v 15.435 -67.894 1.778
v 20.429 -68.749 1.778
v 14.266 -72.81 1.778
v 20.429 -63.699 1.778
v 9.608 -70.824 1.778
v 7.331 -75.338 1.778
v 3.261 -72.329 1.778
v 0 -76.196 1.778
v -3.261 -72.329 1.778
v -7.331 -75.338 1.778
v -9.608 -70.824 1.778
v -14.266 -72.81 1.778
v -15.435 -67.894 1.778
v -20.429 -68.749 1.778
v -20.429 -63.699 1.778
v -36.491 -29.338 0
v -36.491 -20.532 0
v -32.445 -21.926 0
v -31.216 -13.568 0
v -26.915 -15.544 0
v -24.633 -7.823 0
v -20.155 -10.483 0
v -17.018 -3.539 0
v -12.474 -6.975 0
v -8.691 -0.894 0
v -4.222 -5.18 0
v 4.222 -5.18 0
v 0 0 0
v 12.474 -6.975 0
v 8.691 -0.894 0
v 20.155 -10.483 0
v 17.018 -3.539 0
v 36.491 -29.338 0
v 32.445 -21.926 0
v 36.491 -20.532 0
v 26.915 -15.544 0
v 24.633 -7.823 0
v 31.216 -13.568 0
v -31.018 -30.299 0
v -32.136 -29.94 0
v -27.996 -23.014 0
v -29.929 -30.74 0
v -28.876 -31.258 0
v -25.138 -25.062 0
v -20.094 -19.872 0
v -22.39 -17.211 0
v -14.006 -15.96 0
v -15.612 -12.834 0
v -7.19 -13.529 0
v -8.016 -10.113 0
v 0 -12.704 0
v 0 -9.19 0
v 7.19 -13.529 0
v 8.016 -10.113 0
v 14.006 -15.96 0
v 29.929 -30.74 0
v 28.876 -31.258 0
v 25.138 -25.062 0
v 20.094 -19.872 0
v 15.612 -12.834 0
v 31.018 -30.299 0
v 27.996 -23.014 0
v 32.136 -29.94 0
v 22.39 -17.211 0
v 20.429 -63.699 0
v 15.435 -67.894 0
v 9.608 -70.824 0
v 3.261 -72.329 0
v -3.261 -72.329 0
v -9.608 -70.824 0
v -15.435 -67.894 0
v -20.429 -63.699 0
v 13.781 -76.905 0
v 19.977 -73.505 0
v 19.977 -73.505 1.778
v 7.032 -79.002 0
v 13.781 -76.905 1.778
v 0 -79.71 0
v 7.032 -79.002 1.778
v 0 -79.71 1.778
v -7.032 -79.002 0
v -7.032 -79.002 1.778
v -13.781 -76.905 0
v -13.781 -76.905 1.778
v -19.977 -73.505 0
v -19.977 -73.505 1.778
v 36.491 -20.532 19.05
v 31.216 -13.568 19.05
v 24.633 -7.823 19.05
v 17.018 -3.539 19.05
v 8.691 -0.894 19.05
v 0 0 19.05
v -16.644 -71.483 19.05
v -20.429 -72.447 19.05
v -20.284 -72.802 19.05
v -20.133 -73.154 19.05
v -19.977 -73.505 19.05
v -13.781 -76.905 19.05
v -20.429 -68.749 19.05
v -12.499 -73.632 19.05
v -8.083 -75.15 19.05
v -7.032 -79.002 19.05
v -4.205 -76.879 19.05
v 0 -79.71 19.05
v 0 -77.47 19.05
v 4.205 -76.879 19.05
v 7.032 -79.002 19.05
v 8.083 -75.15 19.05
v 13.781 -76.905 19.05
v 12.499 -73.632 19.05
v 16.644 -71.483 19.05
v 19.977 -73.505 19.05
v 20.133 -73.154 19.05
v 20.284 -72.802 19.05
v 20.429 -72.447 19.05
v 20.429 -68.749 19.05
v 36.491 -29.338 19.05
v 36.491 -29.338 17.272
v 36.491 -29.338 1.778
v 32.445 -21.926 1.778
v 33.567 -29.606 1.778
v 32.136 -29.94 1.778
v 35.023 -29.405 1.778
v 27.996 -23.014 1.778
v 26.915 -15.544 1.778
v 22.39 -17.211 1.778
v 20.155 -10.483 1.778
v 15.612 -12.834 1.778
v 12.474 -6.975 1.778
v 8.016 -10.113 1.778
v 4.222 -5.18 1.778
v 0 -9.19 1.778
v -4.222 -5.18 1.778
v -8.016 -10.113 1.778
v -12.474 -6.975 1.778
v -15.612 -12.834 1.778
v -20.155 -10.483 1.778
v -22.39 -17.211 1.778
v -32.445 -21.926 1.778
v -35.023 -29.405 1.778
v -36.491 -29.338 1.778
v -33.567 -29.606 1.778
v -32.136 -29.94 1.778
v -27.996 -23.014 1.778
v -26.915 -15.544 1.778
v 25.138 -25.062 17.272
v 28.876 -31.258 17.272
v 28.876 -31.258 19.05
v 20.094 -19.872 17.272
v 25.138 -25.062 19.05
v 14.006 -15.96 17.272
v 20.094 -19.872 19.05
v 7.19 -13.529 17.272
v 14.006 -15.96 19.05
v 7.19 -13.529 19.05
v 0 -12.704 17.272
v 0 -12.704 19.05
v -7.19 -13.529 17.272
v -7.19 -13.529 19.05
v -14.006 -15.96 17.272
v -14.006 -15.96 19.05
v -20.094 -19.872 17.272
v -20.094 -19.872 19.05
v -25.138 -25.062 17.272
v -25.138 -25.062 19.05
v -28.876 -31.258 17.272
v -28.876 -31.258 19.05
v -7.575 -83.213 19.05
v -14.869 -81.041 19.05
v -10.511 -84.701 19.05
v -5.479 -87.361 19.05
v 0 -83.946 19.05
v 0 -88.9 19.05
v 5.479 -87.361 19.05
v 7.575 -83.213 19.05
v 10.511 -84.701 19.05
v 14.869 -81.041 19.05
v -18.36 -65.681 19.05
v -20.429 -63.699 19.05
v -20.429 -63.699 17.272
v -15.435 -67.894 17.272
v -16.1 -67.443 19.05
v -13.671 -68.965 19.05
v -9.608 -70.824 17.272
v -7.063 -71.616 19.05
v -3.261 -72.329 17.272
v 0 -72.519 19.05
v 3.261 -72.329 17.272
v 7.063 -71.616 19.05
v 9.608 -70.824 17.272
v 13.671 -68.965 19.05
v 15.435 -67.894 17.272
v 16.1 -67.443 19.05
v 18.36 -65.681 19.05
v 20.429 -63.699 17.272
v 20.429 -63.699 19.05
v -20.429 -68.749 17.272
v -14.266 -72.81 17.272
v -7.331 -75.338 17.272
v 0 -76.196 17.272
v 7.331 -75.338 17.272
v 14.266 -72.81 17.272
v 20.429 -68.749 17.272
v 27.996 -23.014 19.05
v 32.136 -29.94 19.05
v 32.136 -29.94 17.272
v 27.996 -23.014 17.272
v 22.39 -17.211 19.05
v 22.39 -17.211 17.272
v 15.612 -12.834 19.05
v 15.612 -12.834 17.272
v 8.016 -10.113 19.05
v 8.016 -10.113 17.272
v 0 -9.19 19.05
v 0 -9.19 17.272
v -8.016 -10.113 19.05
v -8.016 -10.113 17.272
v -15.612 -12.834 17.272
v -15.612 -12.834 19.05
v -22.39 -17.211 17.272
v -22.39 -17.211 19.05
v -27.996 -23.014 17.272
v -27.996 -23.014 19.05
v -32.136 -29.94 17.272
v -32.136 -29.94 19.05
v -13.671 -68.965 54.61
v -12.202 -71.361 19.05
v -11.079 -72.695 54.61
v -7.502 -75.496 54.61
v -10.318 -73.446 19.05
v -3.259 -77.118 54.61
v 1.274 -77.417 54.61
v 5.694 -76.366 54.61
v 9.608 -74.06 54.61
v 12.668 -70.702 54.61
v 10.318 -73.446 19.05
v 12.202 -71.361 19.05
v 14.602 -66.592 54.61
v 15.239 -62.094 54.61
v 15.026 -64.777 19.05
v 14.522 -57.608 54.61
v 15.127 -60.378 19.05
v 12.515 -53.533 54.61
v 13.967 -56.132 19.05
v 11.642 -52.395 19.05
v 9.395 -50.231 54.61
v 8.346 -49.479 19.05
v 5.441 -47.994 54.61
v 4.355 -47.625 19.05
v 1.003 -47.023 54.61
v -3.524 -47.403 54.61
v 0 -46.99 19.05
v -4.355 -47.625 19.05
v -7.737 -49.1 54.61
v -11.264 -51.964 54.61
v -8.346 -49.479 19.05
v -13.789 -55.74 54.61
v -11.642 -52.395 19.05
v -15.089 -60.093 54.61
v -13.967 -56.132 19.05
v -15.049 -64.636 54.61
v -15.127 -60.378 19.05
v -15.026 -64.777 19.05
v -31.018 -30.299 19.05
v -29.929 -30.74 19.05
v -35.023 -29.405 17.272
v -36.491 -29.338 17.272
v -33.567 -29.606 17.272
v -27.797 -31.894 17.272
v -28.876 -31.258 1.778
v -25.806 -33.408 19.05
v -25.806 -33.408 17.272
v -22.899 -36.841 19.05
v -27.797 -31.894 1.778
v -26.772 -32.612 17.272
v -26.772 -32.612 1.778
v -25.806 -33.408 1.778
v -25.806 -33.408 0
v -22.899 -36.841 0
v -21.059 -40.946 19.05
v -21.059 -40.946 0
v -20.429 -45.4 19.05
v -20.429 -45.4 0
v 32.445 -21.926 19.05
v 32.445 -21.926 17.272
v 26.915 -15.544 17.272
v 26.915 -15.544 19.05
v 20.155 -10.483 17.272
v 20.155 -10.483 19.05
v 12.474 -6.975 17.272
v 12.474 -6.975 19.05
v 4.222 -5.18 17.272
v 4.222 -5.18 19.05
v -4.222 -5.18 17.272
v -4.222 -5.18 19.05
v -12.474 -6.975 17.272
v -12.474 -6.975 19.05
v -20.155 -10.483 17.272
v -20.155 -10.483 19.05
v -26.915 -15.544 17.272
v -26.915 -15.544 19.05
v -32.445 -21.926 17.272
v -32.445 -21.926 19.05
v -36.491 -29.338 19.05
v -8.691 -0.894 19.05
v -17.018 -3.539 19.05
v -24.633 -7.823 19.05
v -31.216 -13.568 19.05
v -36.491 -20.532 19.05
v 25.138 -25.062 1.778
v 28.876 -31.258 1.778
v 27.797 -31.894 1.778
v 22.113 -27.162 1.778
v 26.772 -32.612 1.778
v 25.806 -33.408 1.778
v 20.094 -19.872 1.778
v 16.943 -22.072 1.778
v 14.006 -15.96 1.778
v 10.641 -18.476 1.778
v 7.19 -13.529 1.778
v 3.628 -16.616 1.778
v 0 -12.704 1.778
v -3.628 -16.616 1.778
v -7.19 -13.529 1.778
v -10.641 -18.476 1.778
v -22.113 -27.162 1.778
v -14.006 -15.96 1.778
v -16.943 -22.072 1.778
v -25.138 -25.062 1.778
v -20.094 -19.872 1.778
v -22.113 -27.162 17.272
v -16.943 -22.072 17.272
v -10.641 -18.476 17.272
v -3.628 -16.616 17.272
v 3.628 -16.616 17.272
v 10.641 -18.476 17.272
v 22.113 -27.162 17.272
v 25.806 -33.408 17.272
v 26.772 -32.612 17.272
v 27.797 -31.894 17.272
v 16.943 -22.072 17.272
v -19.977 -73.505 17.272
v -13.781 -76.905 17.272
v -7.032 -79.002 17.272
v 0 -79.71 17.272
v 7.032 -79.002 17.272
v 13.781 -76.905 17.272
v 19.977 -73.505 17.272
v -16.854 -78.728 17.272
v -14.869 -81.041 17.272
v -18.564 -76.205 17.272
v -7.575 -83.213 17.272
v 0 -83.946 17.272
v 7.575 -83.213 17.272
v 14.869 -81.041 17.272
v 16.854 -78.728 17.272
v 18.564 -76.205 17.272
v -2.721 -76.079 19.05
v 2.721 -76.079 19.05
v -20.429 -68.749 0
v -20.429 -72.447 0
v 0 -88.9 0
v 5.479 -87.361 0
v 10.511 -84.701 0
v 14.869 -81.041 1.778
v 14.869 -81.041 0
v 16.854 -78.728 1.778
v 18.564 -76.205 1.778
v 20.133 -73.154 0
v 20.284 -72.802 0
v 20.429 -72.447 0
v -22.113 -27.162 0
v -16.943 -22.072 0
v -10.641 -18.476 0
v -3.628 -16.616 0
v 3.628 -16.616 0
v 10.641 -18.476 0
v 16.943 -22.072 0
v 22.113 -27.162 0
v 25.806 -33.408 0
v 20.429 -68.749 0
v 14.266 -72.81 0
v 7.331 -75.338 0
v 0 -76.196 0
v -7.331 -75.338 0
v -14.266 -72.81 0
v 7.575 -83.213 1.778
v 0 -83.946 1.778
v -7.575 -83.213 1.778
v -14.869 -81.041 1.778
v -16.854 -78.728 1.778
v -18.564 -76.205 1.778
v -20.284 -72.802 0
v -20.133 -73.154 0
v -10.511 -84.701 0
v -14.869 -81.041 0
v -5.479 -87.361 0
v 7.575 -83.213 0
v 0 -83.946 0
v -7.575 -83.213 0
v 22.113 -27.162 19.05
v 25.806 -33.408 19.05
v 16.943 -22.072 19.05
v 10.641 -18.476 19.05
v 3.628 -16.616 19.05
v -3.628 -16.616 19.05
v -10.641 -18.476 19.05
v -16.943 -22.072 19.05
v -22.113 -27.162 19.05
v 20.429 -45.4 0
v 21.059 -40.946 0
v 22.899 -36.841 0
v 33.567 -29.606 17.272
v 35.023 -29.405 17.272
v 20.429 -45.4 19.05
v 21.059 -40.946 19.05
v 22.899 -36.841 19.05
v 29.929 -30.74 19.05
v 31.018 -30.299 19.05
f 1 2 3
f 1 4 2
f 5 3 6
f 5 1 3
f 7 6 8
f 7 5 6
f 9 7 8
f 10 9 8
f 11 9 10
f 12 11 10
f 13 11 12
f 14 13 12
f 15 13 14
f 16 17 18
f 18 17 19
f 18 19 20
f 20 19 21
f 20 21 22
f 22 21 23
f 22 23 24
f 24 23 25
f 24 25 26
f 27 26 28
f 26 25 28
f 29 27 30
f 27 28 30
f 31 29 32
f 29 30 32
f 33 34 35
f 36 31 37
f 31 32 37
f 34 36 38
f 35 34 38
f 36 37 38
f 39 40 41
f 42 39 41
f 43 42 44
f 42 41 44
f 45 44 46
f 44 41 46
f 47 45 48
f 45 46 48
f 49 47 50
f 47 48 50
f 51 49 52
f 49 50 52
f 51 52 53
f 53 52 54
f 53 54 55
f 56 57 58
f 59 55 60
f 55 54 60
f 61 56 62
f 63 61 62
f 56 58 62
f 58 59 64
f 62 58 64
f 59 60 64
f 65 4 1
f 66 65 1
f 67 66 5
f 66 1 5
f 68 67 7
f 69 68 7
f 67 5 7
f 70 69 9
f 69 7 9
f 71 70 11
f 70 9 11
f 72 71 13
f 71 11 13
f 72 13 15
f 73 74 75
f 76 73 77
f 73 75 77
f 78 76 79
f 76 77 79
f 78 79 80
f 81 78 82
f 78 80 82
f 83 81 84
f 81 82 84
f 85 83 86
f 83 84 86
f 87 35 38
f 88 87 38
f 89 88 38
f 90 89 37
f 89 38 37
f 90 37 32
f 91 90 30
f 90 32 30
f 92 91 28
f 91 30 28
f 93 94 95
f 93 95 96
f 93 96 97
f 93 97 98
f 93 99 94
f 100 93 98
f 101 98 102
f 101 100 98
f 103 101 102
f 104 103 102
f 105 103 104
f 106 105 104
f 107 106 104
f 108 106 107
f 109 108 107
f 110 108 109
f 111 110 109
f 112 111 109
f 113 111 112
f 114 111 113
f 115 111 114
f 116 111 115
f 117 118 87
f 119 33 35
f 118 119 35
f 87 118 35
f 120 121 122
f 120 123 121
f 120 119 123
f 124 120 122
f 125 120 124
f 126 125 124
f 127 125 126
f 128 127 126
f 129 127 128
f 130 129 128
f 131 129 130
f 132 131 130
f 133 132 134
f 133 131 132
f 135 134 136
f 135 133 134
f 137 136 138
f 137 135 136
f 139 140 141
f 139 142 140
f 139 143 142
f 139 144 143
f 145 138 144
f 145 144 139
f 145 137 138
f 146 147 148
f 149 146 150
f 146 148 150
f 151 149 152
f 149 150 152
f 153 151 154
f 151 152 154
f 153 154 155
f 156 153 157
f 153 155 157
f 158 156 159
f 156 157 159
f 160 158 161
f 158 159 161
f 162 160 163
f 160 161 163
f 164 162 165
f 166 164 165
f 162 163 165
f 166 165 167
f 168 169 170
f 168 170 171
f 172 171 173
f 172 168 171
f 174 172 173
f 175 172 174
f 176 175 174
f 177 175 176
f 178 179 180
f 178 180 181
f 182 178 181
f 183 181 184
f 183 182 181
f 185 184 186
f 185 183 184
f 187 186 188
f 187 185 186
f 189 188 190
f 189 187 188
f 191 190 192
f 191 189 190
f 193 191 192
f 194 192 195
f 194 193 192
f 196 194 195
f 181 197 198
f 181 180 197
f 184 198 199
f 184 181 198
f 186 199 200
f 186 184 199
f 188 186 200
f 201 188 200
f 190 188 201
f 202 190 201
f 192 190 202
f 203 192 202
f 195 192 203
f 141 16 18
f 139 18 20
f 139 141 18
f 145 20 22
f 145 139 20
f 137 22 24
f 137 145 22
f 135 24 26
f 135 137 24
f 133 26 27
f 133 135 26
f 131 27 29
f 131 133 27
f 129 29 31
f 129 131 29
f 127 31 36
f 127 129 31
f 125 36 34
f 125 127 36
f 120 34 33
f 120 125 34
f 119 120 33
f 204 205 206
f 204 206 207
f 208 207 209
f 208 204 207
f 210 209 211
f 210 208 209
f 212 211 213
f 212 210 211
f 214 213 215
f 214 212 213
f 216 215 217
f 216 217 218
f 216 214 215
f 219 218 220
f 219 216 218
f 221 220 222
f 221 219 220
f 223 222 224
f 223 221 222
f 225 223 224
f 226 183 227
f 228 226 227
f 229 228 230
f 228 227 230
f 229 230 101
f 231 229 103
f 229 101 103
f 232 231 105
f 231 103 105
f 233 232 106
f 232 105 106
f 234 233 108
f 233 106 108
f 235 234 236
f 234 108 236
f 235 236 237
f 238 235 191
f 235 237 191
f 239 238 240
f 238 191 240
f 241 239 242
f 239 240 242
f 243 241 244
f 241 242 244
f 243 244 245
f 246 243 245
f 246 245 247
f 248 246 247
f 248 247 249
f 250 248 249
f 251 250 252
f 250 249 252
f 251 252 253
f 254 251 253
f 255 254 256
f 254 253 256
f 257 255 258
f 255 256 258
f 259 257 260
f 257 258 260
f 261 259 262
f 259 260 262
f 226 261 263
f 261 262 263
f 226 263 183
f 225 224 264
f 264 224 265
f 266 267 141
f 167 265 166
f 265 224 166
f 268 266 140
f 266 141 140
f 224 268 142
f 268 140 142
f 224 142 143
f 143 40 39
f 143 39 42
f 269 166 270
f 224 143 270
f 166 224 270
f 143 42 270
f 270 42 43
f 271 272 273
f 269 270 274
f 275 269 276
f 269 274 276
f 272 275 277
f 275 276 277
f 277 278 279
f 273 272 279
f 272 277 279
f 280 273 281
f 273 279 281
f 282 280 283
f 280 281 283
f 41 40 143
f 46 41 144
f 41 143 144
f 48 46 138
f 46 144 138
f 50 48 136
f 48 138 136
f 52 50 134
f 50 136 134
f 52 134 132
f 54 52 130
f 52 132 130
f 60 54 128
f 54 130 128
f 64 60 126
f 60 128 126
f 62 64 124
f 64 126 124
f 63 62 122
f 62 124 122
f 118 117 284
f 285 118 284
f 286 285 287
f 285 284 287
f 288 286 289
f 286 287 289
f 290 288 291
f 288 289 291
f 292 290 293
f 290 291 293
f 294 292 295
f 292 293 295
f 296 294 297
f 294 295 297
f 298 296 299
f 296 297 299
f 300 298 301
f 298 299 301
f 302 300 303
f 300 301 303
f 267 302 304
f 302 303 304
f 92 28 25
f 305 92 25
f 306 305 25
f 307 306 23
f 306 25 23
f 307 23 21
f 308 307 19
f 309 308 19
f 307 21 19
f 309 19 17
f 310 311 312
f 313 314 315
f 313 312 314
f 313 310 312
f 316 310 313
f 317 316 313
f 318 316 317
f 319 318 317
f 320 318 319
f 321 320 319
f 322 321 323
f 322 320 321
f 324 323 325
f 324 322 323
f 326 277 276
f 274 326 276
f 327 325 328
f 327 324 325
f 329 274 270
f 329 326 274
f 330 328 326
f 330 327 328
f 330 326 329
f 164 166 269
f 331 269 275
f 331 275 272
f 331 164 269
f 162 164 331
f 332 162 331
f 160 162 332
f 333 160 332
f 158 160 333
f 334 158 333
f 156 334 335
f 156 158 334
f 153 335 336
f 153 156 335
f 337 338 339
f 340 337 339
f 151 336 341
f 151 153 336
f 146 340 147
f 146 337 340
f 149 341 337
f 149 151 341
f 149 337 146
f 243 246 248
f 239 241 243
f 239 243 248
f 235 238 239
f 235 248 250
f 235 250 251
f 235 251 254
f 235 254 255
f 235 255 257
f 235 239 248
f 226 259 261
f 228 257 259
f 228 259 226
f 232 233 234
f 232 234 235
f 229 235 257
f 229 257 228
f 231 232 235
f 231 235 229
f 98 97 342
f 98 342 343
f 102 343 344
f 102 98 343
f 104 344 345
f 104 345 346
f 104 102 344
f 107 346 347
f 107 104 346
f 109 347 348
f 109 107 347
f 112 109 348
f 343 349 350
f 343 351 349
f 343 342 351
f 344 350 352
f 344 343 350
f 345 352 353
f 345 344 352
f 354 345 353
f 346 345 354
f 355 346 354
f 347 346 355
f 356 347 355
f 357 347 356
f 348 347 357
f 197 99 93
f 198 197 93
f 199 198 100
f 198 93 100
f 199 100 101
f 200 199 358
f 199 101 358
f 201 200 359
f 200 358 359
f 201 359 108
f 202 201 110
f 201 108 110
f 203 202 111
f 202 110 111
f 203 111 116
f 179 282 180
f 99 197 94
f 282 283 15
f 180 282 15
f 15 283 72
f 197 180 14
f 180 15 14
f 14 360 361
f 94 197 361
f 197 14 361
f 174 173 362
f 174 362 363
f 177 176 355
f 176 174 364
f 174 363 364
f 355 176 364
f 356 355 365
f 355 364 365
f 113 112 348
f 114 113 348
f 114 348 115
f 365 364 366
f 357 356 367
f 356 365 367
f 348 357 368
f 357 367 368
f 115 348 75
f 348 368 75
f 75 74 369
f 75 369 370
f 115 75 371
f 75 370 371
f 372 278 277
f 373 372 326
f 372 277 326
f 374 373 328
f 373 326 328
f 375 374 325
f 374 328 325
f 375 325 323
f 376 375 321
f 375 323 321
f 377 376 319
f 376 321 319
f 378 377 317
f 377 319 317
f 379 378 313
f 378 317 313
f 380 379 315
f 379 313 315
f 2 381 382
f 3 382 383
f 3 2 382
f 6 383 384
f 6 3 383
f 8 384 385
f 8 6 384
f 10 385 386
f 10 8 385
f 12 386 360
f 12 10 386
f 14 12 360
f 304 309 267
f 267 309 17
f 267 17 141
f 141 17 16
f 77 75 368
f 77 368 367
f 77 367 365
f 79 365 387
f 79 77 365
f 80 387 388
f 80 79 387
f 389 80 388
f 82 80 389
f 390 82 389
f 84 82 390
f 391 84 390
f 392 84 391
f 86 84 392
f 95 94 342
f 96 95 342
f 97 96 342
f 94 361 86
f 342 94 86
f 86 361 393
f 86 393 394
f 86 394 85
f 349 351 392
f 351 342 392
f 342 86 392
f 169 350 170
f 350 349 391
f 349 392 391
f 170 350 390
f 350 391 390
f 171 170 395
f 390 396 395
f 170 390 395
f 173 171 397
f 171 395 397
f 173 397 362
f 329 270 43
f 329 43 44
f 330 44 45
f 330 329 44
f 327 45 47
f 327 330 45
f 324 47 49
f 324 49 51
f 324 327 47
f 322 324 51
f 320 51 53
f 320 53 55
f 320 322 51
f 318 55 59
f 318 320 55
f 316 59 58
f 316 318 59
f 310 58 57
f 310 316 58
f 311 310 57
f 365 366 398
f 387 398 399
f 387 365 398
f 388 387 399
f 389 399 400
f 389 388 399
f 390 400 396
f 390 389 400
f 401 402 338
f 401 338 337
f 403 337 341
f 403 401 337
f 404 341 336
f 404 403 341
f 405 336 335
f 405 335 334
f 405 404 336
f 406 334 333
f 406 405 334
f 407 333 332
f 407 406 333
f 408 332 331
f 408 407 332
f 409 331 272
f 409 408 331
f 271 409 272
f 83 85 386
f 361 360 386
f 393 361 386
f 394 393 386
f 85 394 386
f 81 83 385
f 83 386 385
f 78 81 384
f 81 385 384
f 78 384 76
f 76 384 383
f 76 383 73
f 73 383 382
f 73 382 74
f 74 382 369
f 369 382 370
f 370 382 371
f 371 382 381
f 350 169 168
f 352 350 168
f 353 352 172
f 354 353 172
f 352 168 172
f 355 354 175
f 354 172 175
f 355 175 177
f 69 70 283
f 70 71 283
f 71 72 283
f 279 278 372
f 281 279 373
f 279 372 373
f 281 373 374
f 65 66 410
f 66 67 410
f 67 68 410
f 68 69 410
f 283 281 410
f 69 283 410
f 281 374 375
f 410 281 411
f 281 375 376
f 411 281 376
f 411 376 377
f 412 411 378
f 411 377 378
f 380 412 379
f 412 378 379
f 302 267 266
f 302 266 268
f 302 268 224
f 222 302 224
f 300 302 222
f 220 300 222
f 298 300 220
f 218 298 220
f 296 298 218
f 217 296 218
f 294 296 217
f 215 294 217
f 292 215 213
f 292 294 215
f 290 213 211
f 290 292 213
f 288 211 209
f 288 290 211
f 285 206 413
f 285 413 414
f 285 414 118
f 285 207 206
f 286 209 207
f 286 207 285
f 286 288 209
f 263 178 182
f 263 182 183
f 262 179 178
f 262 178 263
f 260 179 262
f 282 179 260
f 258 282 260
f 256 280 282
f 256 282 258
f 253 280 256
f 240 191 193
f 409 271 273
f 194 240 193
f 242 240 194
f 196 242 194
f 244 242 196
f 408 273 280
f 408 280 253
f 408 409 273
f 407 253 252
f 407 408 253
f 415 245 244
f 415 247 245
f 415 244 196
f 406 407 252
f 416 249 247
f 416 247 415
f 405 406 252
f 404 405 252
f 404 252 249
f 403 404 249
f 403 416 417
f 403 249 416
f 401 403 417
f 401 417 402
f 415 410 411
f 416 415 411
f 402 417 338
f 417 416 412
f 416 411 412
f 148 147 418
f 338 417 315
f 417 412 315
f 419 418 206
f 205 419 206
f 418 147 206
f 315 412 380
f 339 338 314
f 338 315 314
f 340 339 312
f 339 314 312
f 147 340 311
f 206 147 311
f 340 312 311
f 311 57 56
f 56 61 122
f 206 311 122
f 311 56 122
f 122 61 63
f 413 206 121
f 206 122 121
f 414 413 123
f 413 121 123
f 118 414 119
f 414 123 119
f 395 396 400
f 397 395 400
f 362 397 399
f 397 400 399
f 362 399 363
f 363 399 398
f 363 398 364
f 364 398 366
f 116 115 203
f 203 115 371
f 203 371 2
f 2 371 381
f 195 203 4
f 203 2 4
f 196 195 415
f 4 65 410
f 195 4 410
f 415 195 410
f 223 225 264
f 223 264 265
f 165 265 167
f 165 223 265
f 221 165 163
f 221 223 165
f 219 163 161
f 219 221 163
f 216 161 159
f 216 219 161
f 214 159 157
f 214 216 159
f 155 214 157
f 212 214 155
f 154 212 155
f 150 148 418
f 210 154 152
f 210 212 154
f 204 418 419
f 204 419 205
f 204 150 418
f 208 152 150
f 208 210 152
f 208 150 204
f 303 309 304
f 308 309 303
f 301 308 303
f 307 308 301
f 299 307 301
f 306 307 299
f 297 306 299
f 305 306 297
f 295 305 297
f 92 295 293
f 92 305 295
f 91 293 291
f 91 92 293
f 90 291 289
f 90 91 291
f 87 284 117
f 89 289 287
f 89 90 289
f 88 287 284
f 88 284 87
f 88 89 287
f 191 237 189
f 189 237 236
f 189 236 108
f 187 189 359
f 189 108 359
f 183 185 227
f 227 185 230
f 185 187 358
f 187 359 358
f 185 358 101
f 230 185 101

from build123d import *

# Parameters (mm, degrees)
BOSS_EXTRUDE2_DEPTH = 19.05
SKETCH3_R           = 39.496431486
SKETCH3_R_2         = 35.260007957
CUT_EXTRUDE2_DEPTH  = 1.778
SKETCH4_R           = 31.746180351
SKETCH4_R_2         = 28.068999156
CUT_EXTRUDE3_DEPTH  = 1.778
CUT_EXTRUDE4_START  = -1.778
SKETCH5_R           = 39.496431486
SKETCH5_R_2         = 35.260007957
CUT_EXTRUDE4_DEPTH  = 1.778
CUT_EXTRUDE5_START  = -1.778
SKETCH7_R           = 31.746180351
SKETCH7_R_2         = 28.068999156
CUT_EXTRUDE5_DEPTH  = 1.778
SKETCH8_R           = 15.24
BOSS_EXTRUDE3_DEPTH = 35.56


with BuildPart() as part:
    # Sketch2 → Boss-Extrude2 (new body)
    with BuildSketch(Plane.XY):
        with BuildLine():
            Line((20.429296249, -72.446914532), (20.429296249, -45.399816154))
            ThreePointArc((20.429296249, -45.399816154), (25.133677026, -34.04243628), (36.4910569, -29.338055504))
            Line((36.4910569, -29.338055504), (36.4910569, -20.532405534))
            ThreePointArc((36.4910569, -20.532405534), (20.935477727, -5.485511485), (0, 0))
            ThreePointArc((0, 0), (-20.935477727, -5.485511485), (-36.4910569, -20.532405534))
            Line((-36.4910569, -20.532405534), (-36.4910569, -29.338055504))
            ThreePointArc((-36.4910569, -29.338055504), (-25.133677026, -34.04243628), (-20.429296249, -45.399816154))
            Line((-20.429296249, -45.399816154), (-20.429296249, -72.446914532))
            ThreePointArc((-20.429296249, -72.446914532), (-12.360356233, -83.33771782), (0, -88.9))
            ThreePointArc((0, -88.9), (12.360356233, -83.33771782), (20.429296249, -72.446914532))
        make_face()
    extrude(amount=BOSS_EXTRUDE2_DEPTH)

    # Sketch3 → Cut-Extrude2 (cut)
    with BuildSketch(Plane.XY.offset(19.05)):
        with Locations((0, -44.45)):
            Circle(SKETCH3_R)
        with Locations((0, -44.45)):
            Circle(SKETCH3_R_2, mode=Mode.SUBTRACT)
    extrude(amount=-CUT_EXTRUDE2_DEPTH, mode=Mode.SUBTRACT)

    # Sketch4 → Cut-Extrude3 (cut)
    with BuildSketch(Plane.XY.offset(19.05)):
        with Locations((0, -44.45)):
            Circle(SKETCH4_R)
        with Locations((0, -44.45)):
            Circle(SKETCH4_R_2, mode=Mode.SUBTRACT)
    extrude(amount=-CUT_EXTRUDE3_DEPTH, mode=Mode.SUBTRACT)

    # Sketch5 → Cut-Extrude4 (cut)
    with BuildSketch(Plane(origin=(0, 0, 0), x_dir=(-1, 0, 0), z_dir=(0, 0, -1)).offset(CUT_EXTRUDE4_START)):
        with Locations((0, -44.45)):
            Circle(SKETCH5_R)
        with Locations((0, -44.45)):
            Circle(SKETCH5_R_2, mode=Mode.SUBTRACT)
    extrude(amount=CUT_EXTRUDE4_DEPTH, mode=Mode.SUBTRACT)

    # Sketch7 → Cut-Extrude5 (cut)
    with BuildSketch(Plane(origin=(0, 0, 0), x_dir=(-1, 0, 0), z_dir=(0, 0, -1)).offset(CUT_EXTRUDE5_START)):
        with Locations((0, -44.45)):
            Circle(SKETCH7_R)
        with Locations((0, -44.45)):
            Circle(SKETCH7_R_2, mode=Mode.SUBTRACT)
    extrude(amount=CUT_EXTRUDE5_DEPTH, mode=Mode.SUBTRACT)

    # Sketch8 → Boss-Extrude3 (add)
    with BuildSketch(Plane.XY.offset(19.05)):
        with Locations(Location((0, -62.23, 0), (0, 0, 206.225395775))):
            Circle(SKETCH8_R)
    extrude(amount=BOSS_EXTRUDE3_DEPTH)


solid = part.part
